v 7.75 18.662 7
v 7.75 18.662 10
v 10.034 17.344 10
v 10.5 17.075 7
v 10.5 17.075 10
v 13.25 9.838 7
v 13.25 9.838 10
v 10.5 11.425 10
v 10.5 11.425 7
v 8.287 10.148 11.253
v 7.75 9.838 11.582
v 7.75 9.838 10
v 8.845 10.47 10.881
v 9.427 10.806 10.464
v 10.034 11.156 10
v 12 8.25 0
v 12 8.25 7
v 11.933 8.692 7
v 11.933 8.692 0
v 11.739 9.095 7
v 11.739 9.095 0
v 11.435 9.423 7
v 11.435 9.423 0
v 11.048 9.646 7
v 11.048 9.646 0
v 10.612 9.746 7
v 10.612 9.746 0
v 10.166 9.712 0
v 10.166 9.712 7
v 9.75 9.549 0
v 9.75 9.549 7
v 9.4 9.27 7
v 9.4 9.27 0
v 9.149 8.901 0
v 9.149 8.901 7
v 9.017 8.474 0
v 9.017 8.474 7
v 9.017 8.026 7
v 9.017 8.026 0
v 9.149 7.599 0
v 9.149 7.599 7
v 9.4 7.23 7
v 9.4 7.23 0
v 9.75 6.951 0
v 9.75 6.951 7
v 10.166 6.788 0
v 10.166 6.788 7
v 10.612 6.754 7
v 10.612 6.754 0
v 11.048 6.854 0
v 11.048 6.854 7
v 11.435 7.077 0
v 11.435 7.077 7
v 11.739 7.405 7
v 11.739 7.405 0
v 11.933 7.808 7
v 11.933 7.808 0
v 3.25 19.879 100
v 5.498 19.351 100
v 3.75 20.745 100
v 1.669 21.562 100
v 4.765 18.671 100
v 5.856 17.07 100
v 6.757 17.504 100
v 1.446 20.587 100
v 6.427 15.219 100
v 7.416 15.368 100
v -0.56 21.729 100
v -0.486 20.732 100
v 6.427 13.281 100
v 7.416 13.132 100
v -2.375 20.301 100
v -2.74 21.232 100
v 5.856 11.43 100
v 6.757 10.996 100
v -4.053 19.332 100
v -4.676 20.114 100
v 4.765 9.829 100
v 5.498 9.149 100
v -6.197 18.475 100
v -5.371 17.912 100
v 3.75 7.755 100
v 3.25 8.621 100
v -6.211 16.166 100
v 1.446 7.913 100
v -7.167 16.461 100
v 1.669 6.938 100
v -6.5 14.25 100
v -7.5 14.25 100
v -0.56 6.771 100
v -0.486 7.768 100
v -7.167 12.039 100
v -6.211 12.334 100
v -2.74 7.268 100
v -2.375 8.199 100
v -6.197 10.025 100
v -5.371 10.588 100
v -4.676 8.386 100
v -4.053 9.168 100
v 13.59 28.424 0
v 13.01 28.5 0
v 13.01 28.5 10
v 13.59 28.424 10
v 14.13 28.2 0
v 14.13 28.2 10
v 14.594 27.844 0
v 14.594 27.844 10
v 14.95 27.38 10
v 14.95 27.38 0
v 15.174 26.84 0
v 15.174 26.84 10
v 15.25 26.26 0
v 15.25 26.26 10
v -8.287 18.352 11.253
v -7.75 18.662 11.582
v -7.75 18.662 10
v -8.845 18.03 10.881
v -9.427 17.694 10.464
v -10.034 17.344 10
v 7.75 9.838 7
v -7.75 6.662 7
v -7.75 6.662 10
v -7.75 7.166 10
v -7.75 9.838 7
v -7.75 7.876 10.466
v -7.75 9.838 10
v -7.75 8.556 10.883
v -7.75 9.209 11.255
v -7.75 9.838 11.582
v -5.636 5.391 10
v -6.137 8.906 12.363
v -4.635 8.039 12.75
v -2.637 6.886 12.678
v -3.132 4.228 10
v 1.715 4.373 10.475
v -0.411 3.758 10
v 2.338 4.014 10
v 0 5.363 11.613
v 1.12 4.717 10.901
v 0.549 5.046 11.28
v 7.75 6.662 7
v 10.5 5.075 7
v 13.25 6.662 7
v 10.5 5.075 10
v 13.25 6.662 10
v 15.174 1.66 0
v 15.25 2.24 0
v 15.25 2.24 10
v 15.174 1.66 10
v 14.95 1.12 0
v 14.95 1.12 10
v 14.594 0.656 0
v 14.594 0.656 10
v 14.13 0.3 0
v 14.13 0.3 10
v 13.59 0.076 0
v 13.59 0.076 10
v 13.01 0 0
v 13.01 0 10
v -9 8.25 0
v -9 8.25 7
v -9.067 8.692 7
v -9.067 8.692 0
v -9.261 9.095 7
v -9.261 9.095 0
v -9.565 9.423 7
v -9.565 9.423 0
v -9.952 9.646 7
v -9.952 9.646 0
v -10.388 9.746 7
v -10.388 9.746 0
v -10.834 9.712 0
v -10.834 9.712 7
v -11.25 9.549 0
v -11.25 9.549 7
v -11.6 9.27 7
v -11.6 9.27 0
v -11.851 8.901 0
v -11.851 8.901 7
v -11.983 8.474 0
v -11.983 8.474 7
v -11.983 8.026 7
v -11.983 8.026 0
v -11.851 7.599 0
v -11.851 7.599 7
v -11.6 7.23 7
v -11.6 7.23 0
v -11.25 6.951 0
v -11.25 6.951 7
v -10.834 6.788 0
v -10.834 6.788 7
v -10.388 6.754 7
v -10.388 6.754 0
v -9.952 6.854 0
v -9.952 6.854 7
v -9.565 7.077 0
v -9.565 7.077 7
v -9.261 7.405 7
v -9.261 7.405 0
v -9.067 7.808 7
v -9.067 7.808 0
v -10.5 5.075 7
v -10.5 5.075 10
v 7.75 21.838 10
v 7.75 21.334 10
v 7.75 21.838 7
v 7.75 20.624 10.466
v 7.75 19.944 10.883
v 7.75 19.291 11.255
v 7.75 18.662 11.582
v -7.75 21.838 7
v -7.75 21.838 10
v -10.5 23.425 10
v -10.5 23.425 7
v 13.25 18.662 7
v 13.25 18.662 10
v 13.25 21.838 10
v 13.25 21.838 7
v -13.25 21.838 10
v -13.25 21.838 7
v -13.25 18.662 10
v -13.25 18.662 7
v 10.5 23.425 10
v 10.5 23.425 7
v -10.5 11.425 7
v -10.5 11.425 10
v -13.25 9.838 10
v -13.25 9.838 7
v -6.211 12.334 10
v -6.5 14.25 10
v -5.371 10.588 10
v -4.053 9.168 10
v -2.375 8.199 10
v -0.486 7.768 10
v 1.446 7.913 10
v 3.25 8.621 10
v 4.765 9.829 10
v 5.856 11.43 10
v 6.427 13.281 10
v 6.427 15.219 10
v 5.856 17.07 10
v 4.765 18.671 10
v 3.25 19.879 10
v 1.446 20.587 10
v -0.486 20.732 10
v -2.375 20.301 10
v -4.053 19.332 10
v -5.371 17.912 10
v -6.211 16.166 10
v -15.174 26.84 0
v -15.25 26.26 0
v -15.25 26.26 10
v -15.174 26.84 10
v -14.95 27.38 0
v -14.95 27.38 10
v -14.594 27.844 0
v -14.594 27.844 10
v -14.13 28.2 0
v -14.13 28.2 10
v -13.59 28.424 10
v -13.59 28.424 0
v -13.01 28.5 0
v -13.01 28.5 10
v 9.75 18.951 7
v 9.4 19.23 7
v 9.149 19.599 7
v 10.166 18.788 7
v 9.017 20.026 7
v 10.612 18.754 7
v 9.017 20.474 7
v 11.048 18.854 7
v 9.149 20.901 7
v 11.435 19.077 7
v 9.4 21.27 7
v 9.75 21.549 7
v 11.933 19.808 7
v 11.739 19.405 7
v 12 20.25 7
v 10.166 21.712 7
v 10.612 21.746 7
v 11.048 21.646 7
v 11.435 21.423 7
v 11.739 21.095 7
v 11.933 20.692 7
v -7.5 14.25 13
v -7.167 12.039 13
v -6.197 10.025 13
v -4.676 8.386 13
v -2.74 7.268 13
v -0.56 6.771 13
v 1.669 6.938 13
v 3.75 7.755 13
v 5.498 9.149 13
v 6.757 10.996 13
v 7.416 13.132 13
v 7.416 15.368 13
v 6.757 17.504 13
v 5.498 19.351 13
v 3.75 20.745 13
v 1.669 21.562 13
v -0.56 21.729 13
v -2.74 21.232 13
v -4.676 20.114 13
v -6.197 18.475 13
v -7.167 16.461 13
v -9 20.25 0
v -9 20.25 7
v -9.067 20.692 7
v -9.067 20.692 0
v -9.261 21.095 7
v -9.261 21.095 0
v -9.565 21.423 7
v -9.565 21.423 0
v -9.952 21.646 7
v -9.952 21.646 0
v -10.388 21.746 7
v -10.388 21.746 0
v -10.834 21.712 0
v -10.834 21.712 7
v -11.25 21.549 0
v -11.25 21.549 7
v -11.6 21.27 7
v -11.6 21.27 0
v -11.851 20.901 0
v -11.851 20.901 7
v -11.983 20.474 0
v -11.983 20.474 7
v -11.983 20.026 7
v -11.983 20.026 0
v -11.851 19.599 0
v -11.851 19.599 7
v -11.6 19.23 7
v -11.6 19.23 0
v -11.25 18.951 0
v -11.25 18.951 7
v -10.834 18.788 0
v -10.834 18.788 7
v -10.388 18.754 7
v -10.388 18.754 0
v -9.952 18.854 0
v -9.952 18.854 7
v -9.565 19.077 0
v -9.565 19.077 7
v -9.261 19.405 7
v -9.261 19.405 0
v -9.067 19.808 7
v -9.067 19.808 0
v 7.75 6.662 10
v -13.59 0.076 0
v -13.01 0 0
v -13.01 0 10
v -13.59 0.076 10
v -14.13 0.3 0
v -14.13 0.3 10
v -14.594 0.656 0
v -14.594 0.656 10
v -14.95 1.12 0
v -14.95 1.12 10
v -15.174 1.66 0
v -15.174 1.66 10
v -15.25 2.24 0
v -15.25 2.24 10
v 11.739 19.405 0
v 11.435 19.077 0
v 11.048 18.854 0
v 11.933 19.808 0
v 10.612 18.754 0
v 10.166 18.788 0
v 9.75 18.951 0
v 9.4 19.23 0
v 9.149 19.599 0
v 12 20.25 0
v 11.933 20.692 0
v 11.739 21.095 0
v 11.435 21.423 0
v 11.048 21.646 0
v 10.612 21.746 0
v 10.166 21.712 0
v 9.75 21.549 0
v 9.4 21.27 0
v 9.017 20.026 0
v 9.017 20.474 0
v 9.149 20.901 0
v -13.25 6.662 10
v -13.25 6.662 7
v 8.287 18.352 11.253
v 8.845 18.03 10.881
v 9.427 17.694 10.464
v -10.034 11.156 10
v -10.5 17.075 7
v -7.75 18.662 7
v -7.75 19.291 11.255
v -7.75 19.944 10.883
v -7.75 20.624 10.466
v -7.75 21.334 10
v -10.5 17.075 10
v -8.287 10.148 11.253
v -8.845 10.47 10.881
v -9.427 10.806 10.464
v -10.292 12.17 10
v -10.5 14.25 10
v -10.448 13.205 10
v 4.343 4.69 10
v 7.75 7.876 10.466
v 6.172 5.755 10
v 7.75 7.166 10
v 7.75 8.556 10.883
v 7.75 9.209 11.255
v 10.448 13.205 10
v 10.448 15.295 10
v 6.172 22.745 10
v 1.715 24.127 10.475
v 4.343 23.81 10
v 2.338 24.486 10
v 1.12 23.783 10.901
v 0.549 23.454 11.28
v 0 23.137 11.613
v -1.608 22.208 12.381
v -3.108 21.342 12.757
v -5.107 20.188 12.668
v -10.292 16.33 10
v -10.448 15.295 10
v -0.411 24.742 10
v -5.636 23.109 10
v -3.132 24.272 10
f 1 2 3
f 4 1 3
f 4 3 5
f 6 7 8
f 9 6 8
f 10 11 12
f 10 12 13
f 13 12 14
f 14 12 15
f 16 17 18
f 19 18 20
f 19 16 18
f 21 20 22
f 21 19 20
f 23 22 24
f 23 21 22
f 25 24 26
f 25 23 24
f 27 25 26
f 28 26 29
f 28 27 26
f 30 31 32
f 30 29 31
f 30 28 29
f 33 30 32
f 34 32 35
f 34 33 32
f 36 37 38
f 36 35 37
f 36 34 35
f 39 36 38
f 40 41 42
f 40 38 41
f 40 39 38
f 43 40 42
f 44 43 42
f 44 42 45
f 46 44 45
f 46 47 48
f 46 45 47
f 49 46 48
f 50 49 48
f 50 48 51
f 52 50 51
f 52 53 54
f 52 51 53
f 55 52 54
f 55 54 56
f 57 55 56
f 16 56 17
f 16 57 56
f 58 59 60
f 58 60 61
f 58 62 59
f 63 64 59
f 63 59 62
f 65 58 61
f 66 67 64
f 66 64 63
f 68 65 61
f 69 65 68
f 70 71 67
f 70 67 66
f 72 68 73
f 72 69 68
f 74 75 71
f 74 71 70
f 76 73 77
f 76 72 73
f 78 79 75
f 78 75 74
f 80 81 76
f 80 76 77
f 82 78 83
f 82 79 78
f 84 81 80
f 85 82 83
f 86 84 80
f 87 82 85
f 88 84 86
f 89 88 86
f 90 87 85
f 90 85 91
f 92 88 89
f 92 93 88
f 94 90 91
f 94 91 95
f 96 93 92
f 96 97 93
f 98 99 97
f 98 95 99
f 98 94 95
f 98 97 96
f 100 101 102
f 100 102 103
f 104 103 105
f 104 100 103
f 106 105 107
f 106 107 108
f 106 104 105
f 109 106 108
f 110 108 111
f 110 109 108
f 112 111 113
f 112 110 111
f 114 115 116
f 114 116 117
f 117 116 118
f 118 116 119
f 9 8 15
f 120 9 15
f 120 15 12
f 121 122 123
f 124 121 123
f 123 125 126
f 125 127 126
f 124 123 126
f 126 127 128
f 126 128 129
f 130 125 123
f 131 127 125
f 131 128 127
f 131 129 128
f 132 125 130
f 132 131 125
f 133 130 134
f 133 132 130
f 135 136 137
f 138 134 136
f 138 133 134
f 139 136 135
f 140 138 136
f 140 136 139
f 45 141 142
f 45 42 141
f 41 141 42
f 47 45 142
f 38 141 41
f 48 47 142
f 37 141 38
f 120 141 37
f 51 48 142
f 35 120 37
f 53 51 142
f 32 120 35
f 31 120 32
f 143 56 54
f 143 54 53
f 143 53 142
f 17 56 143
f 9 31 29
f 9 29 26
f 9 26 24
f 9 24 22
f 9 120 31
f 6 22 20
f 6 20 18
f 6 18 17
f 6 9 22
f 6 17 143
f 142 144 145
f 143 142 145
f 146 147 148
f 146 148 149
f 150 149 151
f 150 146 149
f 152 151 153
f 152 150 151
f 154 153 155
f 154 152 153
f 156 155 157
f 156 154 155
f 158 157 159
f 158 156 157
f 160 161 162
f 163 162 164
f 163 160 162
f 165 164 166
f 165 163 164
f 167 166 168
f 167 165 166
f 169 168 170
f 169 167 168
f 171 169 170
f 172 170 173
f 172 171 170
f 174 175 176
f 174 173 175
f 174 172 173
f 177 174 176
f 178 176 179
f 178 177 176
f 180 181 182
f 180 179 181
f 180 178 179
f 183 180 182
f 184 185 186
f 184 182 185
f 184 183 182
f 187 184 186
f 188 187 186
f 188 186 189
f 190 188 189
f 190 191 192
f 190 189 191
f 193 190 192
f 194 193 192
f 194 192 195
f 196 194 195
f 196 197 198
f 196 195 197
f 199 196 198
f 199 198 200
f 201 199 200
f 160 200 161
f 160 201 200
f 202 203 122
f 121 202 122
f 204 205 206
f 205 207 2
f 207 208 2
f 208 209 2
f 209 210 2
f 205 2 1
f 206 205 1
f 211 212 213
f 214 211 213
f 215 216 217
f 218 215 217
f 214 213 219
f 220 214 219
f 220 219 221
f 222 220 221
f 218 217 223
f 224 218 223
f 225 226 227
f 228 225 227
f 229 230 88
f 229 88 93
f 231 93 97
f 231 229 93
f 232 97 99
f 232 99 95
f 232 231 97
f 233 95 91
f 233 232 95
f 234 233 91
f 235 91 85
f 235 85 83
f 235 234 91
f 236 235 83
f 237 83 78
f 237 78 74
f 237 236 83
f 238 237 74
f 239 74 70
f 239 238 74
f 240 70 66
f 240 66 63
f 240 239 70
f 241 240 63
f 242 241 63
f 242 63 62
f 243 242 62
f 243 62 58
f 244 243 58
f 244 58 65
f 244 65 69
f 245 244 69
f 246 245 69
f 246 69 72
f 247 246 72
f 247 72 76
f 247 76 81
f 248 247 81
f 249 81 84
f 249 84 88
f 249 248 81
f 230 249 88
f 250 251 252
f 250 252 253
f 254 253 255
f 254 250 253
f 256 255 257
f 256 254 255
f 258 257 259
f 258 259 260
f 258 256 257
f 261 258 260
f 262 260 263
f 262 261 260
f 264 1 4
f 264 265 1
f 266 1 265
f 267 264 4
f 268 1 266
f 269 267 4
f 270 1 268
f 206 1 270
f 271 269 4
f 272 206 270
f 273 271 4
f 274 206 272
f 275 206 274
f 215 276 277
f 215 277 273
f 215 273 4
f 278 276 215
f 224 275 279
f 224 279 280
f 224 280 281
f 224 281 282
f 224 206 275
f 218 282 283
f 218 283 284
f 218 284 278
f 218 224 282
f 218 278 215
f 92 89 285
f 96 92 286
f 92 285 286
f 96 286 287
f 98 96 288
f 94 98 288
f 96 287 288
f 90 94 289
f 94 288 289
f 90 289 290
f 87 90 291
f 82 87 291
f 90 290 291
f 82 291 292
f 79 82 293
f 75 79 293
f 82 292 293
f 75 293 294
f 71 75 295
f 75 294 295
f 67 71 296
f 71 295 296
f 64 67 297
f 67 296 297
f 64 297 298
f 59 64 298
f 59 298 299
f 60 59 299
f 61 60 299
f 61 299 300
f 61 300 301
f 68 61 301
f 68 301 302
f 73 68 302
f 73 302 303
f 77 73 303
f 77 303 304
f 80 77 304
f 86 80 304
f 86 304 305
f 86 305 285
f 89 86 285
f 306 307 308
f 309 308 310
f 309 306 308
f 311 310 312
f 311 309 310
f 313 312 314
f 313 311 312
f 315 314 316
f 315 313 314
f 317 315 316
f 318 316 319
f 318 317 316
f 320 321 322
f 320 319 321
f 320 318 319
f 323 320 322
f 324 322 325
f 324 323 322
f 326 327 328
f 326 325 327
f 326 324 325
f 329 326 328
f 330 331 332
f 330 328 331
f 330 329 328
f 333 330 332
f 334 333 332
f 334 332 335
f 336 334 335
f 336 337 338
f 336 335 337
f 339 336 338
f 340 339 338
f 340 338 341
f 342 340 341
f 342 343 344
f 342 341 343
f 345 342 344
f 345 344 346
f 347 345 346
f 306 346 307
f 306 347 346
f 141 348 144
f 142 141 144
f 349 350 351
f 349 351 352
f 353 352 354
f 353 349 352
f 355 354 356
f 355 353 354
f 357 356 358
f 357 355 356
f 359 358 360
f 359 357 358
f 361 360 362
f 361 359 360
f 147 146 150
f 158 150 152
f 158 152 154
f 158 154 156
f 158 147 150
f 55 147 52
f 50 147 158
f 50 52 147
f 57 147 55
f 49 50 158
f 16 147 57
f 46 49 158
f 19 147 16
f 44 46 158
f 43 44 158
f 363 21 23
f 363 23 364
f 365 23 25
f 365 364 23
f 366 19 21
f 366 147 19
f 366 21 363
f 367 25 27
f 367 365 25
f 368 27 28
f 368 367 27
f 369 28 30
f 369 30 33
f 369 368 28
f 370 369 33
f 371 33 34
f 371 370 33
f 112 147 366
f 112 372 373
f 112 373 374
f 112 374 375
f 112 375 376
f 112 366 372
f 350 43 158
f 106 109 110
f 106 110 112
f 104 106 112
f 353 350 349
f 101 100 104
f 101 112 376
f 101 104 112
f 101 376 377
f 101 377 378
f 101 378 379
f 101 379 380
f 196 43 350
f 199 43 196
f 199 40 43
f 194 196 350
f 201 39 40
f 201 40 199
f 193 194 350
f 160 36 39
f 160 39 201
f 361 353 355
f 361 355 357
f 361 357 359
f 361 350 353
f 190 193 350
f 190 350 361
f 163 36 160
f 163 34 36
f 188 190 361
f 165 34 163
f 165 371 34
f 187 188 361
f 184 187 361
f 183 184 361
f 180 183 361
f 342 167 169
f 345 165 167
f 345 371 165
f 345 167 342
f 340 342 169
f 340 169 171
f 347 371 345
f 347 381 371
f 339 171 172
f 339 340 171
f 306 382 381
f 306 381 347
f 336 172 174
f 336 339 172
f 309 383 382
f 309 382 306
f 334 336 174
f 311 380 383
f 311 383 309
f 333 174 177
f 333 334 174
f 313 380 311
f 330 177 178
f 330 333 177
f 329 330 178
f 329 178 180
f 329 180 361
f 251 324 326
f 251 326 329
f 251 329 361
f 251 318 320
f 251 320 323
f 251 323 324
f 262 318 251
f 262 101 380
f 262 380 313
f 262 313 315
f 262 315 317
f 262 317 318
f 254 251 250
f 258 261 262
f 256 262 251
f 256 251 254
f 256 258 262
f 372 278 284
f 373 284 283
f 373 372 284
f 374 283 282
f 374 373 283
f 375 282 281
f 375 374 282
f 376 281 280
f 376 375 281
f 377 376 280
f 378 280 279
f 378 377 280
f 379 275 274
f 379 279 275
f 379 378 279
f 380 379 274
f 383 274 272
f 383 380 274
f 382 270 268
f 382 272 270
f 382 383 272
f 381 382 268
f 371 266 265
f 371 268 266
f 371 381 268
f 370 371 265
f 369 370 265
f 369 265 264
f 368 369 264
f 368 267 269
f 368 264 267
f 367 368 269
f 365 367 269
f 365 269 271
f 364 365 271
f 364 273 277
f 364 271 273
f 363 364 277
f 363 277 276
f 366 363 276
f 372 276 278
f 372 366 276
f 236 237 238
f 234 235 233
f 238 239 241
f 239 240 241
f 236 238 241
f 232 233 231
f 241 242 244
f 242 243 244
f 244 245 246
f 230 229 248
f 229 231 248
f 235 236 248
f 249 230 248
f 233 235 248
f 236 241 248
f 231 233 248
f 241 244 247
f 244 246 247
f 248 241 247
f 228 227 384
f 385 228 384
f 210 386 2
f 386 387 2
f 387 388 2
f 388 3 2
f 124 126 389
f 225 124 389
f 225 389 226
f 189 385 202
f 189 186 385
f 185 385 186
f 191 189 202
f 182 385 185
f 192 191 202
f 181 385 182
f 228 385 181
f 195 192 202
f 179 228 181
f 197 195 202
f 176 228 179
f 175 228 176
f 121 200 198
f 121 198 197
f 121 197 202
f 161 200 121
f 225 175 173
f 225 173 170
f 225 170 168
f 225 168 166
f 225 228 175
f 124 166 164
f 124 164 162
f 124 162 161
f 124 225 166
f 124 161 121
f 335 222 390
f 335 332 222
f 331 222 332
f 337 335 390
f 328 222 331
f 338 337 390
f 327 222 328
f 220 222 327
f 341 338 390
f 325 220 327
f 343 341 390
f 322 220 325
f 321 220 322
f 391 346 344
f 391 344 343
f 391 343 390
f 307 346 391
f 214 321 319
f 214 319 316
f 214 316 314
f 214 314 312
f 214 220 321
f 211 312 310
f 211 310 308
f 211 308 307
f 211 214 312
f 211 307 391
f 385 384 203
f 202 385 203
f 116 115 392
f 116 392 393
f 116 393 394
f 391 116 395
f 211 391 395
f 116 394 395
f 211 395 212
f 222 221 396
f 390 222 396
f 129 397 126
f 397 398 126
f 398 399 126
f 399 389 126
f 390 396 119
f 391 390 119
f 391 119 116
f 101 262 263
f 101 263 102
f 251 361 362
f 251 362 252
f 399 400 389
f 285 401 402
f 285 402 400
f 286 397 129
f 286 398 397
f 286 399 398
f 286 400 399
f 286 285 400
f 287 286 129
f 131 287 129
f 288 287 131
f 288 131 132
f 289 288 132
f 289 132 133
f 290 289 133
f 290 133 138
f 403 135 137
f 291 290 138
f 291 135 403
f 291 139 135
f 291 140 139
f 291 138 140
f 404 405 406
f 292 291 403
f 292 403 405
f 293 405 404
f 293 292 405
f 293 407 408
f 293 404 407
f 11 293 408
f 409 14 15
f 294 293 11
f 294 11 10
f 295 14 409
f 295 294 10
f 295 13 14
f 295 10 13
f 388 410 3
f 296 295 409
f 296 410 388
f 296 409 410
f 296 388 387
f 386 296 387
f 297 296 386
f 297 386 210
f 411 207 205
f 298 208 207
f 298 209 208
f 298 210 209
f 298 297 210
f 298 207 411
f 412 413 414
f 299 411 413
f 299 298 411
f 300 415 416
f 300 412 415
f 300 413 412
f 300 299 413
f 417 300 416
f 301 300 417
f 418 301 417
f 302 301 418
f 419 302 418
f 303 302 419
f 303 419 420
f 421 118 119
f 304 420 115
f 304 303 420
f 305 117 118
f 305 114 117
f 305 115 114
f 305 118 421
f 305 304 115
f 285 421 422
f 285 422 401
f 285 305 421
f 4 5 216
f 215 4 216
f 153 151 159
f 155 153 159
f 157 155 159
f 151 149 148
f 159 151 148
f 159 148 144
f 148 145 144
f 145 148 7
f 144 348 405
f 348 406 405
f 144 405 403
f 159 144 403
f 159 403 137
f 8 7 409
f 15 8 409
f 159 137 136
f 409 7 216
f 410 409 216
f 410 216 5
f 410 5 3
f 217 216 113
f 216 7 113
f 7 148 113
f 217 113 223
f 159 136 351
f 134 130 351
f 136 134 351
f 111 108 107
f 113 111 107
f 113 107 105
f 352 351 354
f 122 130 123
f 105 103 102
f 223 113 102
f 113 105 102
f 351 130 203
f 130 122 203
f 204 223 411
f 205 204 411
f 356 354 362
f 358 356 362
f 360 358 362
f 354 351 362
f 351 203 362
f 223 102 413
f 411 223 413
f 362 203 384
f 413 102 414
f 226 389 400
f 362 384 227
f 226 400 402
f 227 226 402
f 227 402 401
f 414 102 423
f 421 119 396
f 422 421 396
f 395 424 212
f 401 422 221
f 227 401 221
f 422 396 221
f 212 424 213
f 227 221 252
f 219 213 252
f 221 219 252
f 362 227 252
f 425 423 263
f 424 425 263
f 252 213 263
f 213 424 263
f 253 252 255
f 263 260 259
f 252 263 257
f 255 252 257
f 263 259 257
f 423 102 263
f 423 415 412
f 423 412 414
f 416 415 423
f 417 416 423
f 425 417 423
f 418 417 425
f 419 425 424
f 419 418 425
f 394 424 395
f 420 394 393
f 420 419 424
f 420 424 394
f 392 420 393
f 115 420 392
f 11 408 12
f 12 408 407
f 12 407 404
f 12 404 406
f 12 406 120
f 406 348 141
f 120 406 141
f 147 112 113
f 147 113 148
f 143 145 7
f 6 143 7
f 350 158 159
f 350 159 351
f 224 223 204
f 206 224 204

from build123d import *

# Parameters (mm, degrees)
SKETCH1_R           = 1.5
BOSS_EXTRUDE1_DEPTH = 10
CUT_EXTRUDE2_DEPTH  = 3
SKETCH3_R           = 7.5
SKETCH3_R_2         = 6.5
BOSS_EXTRUDE2_DEPTH = 90
CHAMFER1_SIZE       = 3


with BuildPart() as part:
    # Sketch1 → Boss-Extrude1 (new body)
    with BuildSketch(Plane.XY):
        with BuildLine():
            Line((-13.009713205, 28.5), (13.009713205, 28.5))
            ThreePointArc((13.009713205, 28.5), (14.59383519, 27.84383519), (15.25, 26.259713205))
            Line((15.25, 26.259713205), (15.25, 2.240286795))
            ThreePointArc((15.25, 2.240286795), (14.59383519, 0.65616481), (13.009713205, 0))
            Line((13.009713205, 0), (-13.009713205, 0))
            ThreePointArc((-13.009713205, 0), (-14.59383519, 0.65616481), (-15.25, 2.240286795))
            Line((-15.25, 2.240286795), (-15.25, 26.259713205))
            ThreePointArc((-15.25, 26.259713205), (-14.59383519, 27.84383519), (-13.009713205, 28.5))
        make_face()
        with Locations((-10.5, 20.25)):
            Circle(SKETCH1_R, mode=Mode.SUBTRACT)
        with Locations((10.5, 20.25)):
            Circle(SKETCH1_R, mode=Mode.SUBTRACT)
        with Locations((10.5, 8.25)):
            Circle(SKETCH1_R, mode=Mode.SUBTRACT)
        with Locations((-10.5, 8.25)):
            Circle(SKETCH1_R, mode=Mode.SUBTRACT)
    extrude(amount=BOSS_EXTRUDE1_DEPTH)

    # Sketch2 → Cut-Extrude2 (cut)
    with BuildSketch(Plane.XY.offset(10)):
        Polygon((-10.5, 23.425426481), (-13.25, 21.83771324), (-13.25, 18.66228676), (-10.5, 17.074573519), (-7.75, 18.66228676), (-7.75, 21.83771324), align=None)
        Polygon((-10.5, 11.425426481), (-13.25, 9.83771324), (-13.25, 6.66228676), (-10.5, 5.074573519), (-7.75, 6.66228676), (-7.75, 9.83771324), align=None)
        Polygon((10.5, 23.425426481), (7.75, 21.83771324), (7.75, 18.66228676), (10.5, 17.074573519), (13.25, 18.66228676), (13.25, 21.83771324), align=None)
        Polygon((10.5, 11.425426481), (7.75, 9.83771324), (7.75, 6.66228676), (10.5, 5.074573519), (13.25, 6.66228676), (13.25, 9.83771324), align=None)
    extrude(amount=-CUT_EXTRUDE2_DEPTH, mode=Mode.SUBTRACT)

    # Sketch3 → Boss-Extrude2 (add)
    with BuildSketch(Plane.XY.offset(10)):
        with Locations(Location((0, 14.25, 0), (0, 0, 180))):
            Circle(SKETCH3_R)
        with Locations(Location((0, 14.25, 0), (0, 0, 180))):
            Circle(SKETCH3_R_2, mode=Mode.SUBTRACT)
    extrude(amount=BOSS_EXTRUDE2_DEPTH)

    # Chamfer1
    # the kernel refuses this chamfer: 3 mm, written as the material it adds along each edge
    with BuildSketch(Plane(origin=(0, 14.25, 10), x_dir=(-1, 0, 0), z_dir=(0, 1, 0))) as chamfer1_piece_1_section:
        Polygon((7.5 + CHAMFER1_SIZE, 0), (7.5, CHAMFER1_SIZE), (7.5, 0), align=None)
    chamfer1_piece_1 = revolve(axis=Axis((0, 14.25, 10), (0, 0, 1)), mode=Mode.PRIVATE)
    chamfer1_piece_1 = split(chamfer1_piece_1, bisect_by=Plane(origin=(7.75, 14.25, 10.835375001), z_dir=(-1, 0, 0)), keep=Keep.TOP, mode=Mode.PRIVATE)
    chamfer1_piece_1 = split(chamfer1_piece_1, bisect_by=Plane(origin=(-10.27932295, 11.298018527, 10.835375001), z_dir=(0.4999999999999999, 0.8660254037844388, 0)), keep=Keep.TOP, mode=Mode.PRIVATE)
    chamfer1_piece_1 = split(chamfer1_piece_1, bisect_by=Plane(origin=(-10.27932295, 17.201981474, 10.835375001), z_dir=(0.5000000000000004, -0.8660254037844384, 0)), keep=Keep.TOP, mode=Mode.PRIVATE)
    add(chamfer1_piece_1)
    with BuildSketch(Plane(origin=(0, 14.25, 10), x_dir=(-1, 0, 0), z_dir=(0, 1, 0))) as chamfer1_piece_2_section:
        Polygon((7.5 + CHAMFER1_SIZE, 0), (7.5, CHAMFER1_SIZE), (7.5, 0), align=None)
    chamfer1_piece_2 = revolve(axis=Axis((0, 14.25, 10), (0, 0, 1)), mode=Mode.PRIVATE)
    chamfer1_piece_2 = split(chamfer1_piece_2, bisect_by=Plane(origin=(7.75, 21.633797899, 10.850650839), z_dir=(-1, 0, 0)), keep=Keep.TOP, mode=Mode.PRIVATE)
    chamfer1_piece_2 = split(chamfer1_piece_2, bisect_by=Plane(origin=(-7.75, 21.633797899, 10.850650839), z_dir=(1, 0, 0)), keep=Keep.TOP, mode=Mode.PRIVATE)
    add(chamfer1_piece_2)
    with BuildSketch(Plane(origin=(0, 14.25, 10), x_dir=(-1, 0, 0), z_dir=(0, 1, 0))) as chamfer1_piece_3_section:
        Polygon((7.5 + CHAMFER1_SIZE, 0), (7.5, CHAMFER1_SIZE), (7.5, 0), align=None)
    chamfer1_piece_3 = revolve(axis=Axis((0, 14.25, 10), (0, 0, 1)), mode=Mode.PRIVATE)
    chamfer1_piece_3 = split(chamfer1_piece_3, bisect_by=Plane(origin=(10.279322953, 11.298018528, 10.835374999), z_dir=(-0.5000000000000011, 0.866025403784438, 0)), keep=Keep.TOP, mode=Mode.PRIVATE)
    chamfer1_piece_3 = split(chamfer1_piece_3, bisect_by=Plane(origin=(-7.75, 14.25, 10.835374999), z_dir=(1, 0, 0)), keep=Keep.TOP, mode=Mode.PRIVATE)
    chamfer1_piece_3 = split(chamfer1_piece_3, bisect_by=Plane(origin=(10.279322953, 17.201981472, 10.835374999), z_dir=(-0.49999999999999445, -0.8660254037844419, 0)), keep=Keep.TOP, mode=Mode.PRIVATE)
    add(chamfer1_piece_3)


solid = part.part
